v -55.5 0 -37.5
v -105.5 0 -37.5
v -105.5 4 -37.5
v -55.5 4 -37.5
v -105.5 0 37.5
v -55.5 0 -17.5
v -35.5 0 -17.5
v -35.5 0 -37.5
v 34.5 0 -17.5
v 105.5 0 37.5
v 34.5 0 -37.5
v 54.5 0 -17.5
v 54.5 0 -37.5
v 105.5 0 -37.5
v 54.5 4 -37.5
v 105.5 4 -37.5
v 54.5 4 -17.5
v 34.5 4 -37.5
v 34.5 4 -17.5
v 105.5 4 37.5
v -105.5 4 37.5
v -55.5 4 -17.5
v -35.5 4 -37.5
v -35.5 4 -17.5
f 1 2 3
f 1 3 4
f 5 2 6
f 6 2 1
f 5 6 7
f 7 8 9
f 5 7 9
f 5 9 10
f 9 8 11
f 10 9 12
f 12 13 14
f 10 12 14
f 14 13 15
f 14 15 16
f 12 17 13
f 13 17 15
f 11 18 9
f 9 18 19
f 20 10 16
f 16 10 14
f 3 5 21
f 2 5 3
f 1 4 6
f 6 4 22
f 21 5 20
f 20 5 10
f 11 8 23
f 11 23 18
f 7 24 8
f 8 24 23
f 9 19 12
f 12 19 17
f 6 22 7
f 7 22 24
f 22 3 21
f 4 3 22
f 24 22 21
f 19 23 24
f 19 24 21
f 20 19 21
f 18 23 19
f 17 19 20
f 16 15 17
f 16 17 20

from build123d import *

# Parameters (mm, degrees)
SKETCH1_W           = 211
SKETCH1_H           = 75
BOSS_EXTRUDE1_DEPTH = 4
CUT_EXTRUDE2_REACH  = 114.038
CUT_EXTRUDE3_REACH  = 114.038


with BuildPart() as part:
    # Sketch1 → Boss-Extrude1 (new body)
    with BuildSketch(Plane(origin=(0, 0, 0), x_dir=(1, 0, 0), z_dir=(0, 1, 0))):
        Rectangle(SKETCH1_W, SKETCH1_H)
    extrude(amount=BOSS_EXTRUDE1_DEPTH)

    # Sketch3 → Cut-Extrude2 (cut, up to next)
    with BuildSketch(Plane(origin=(0, 4, 0), x_dir=(1, 0, 0), z_dir=(0, 1, 0)), mode=Mode.PRIVATE) as cut_extrude2_sk1:
        Polygon((-55.5, 37.5), (-55.5, 17.5), (-35.5, 17.5), (-35.5, 21.173298158), (-35.5, 37.5), align=None)
    cut_extrude2_tool1 = extrude(cut_extrude2_sk1.sketch, amount=-CUT_EXTRUDE2_REACH, mode=Mode.PRIVATE) & part.part
    add(cut_extrude2_tool1.solids().sort_by_distance((-45.5, 4, -27.5))[0], mode=Mode.SUBTRACT)

    # Sketch5 → Cut-Extrude3 (cut, up to next)
    with BuildSketch(Plane(origin=(0, 4, 0), x_dir=(1, 0, 0), z_dir=(0, 1, 0)), mode=Mode.PRIVATE) as cut_extrude3_sk1:
        Polygon((44.5, 17.5), (54.5, 17.5), (54.5, 37.5), (34.5, 37.5), (34.5, 17.5), align=None)
    cut_extrude3_tool1 = extrude(cut_extrude3_sk1.sketch, amount=-CUT_EXTRUDE3_REACH, mode=Mode.PRIVATE) & part.part
    add(cut_extrude3_tool1.solids().sort_by_distance((44.5, 4, -27.5))[0], mode=Mode.SUBTRACT)


solid = part.part
